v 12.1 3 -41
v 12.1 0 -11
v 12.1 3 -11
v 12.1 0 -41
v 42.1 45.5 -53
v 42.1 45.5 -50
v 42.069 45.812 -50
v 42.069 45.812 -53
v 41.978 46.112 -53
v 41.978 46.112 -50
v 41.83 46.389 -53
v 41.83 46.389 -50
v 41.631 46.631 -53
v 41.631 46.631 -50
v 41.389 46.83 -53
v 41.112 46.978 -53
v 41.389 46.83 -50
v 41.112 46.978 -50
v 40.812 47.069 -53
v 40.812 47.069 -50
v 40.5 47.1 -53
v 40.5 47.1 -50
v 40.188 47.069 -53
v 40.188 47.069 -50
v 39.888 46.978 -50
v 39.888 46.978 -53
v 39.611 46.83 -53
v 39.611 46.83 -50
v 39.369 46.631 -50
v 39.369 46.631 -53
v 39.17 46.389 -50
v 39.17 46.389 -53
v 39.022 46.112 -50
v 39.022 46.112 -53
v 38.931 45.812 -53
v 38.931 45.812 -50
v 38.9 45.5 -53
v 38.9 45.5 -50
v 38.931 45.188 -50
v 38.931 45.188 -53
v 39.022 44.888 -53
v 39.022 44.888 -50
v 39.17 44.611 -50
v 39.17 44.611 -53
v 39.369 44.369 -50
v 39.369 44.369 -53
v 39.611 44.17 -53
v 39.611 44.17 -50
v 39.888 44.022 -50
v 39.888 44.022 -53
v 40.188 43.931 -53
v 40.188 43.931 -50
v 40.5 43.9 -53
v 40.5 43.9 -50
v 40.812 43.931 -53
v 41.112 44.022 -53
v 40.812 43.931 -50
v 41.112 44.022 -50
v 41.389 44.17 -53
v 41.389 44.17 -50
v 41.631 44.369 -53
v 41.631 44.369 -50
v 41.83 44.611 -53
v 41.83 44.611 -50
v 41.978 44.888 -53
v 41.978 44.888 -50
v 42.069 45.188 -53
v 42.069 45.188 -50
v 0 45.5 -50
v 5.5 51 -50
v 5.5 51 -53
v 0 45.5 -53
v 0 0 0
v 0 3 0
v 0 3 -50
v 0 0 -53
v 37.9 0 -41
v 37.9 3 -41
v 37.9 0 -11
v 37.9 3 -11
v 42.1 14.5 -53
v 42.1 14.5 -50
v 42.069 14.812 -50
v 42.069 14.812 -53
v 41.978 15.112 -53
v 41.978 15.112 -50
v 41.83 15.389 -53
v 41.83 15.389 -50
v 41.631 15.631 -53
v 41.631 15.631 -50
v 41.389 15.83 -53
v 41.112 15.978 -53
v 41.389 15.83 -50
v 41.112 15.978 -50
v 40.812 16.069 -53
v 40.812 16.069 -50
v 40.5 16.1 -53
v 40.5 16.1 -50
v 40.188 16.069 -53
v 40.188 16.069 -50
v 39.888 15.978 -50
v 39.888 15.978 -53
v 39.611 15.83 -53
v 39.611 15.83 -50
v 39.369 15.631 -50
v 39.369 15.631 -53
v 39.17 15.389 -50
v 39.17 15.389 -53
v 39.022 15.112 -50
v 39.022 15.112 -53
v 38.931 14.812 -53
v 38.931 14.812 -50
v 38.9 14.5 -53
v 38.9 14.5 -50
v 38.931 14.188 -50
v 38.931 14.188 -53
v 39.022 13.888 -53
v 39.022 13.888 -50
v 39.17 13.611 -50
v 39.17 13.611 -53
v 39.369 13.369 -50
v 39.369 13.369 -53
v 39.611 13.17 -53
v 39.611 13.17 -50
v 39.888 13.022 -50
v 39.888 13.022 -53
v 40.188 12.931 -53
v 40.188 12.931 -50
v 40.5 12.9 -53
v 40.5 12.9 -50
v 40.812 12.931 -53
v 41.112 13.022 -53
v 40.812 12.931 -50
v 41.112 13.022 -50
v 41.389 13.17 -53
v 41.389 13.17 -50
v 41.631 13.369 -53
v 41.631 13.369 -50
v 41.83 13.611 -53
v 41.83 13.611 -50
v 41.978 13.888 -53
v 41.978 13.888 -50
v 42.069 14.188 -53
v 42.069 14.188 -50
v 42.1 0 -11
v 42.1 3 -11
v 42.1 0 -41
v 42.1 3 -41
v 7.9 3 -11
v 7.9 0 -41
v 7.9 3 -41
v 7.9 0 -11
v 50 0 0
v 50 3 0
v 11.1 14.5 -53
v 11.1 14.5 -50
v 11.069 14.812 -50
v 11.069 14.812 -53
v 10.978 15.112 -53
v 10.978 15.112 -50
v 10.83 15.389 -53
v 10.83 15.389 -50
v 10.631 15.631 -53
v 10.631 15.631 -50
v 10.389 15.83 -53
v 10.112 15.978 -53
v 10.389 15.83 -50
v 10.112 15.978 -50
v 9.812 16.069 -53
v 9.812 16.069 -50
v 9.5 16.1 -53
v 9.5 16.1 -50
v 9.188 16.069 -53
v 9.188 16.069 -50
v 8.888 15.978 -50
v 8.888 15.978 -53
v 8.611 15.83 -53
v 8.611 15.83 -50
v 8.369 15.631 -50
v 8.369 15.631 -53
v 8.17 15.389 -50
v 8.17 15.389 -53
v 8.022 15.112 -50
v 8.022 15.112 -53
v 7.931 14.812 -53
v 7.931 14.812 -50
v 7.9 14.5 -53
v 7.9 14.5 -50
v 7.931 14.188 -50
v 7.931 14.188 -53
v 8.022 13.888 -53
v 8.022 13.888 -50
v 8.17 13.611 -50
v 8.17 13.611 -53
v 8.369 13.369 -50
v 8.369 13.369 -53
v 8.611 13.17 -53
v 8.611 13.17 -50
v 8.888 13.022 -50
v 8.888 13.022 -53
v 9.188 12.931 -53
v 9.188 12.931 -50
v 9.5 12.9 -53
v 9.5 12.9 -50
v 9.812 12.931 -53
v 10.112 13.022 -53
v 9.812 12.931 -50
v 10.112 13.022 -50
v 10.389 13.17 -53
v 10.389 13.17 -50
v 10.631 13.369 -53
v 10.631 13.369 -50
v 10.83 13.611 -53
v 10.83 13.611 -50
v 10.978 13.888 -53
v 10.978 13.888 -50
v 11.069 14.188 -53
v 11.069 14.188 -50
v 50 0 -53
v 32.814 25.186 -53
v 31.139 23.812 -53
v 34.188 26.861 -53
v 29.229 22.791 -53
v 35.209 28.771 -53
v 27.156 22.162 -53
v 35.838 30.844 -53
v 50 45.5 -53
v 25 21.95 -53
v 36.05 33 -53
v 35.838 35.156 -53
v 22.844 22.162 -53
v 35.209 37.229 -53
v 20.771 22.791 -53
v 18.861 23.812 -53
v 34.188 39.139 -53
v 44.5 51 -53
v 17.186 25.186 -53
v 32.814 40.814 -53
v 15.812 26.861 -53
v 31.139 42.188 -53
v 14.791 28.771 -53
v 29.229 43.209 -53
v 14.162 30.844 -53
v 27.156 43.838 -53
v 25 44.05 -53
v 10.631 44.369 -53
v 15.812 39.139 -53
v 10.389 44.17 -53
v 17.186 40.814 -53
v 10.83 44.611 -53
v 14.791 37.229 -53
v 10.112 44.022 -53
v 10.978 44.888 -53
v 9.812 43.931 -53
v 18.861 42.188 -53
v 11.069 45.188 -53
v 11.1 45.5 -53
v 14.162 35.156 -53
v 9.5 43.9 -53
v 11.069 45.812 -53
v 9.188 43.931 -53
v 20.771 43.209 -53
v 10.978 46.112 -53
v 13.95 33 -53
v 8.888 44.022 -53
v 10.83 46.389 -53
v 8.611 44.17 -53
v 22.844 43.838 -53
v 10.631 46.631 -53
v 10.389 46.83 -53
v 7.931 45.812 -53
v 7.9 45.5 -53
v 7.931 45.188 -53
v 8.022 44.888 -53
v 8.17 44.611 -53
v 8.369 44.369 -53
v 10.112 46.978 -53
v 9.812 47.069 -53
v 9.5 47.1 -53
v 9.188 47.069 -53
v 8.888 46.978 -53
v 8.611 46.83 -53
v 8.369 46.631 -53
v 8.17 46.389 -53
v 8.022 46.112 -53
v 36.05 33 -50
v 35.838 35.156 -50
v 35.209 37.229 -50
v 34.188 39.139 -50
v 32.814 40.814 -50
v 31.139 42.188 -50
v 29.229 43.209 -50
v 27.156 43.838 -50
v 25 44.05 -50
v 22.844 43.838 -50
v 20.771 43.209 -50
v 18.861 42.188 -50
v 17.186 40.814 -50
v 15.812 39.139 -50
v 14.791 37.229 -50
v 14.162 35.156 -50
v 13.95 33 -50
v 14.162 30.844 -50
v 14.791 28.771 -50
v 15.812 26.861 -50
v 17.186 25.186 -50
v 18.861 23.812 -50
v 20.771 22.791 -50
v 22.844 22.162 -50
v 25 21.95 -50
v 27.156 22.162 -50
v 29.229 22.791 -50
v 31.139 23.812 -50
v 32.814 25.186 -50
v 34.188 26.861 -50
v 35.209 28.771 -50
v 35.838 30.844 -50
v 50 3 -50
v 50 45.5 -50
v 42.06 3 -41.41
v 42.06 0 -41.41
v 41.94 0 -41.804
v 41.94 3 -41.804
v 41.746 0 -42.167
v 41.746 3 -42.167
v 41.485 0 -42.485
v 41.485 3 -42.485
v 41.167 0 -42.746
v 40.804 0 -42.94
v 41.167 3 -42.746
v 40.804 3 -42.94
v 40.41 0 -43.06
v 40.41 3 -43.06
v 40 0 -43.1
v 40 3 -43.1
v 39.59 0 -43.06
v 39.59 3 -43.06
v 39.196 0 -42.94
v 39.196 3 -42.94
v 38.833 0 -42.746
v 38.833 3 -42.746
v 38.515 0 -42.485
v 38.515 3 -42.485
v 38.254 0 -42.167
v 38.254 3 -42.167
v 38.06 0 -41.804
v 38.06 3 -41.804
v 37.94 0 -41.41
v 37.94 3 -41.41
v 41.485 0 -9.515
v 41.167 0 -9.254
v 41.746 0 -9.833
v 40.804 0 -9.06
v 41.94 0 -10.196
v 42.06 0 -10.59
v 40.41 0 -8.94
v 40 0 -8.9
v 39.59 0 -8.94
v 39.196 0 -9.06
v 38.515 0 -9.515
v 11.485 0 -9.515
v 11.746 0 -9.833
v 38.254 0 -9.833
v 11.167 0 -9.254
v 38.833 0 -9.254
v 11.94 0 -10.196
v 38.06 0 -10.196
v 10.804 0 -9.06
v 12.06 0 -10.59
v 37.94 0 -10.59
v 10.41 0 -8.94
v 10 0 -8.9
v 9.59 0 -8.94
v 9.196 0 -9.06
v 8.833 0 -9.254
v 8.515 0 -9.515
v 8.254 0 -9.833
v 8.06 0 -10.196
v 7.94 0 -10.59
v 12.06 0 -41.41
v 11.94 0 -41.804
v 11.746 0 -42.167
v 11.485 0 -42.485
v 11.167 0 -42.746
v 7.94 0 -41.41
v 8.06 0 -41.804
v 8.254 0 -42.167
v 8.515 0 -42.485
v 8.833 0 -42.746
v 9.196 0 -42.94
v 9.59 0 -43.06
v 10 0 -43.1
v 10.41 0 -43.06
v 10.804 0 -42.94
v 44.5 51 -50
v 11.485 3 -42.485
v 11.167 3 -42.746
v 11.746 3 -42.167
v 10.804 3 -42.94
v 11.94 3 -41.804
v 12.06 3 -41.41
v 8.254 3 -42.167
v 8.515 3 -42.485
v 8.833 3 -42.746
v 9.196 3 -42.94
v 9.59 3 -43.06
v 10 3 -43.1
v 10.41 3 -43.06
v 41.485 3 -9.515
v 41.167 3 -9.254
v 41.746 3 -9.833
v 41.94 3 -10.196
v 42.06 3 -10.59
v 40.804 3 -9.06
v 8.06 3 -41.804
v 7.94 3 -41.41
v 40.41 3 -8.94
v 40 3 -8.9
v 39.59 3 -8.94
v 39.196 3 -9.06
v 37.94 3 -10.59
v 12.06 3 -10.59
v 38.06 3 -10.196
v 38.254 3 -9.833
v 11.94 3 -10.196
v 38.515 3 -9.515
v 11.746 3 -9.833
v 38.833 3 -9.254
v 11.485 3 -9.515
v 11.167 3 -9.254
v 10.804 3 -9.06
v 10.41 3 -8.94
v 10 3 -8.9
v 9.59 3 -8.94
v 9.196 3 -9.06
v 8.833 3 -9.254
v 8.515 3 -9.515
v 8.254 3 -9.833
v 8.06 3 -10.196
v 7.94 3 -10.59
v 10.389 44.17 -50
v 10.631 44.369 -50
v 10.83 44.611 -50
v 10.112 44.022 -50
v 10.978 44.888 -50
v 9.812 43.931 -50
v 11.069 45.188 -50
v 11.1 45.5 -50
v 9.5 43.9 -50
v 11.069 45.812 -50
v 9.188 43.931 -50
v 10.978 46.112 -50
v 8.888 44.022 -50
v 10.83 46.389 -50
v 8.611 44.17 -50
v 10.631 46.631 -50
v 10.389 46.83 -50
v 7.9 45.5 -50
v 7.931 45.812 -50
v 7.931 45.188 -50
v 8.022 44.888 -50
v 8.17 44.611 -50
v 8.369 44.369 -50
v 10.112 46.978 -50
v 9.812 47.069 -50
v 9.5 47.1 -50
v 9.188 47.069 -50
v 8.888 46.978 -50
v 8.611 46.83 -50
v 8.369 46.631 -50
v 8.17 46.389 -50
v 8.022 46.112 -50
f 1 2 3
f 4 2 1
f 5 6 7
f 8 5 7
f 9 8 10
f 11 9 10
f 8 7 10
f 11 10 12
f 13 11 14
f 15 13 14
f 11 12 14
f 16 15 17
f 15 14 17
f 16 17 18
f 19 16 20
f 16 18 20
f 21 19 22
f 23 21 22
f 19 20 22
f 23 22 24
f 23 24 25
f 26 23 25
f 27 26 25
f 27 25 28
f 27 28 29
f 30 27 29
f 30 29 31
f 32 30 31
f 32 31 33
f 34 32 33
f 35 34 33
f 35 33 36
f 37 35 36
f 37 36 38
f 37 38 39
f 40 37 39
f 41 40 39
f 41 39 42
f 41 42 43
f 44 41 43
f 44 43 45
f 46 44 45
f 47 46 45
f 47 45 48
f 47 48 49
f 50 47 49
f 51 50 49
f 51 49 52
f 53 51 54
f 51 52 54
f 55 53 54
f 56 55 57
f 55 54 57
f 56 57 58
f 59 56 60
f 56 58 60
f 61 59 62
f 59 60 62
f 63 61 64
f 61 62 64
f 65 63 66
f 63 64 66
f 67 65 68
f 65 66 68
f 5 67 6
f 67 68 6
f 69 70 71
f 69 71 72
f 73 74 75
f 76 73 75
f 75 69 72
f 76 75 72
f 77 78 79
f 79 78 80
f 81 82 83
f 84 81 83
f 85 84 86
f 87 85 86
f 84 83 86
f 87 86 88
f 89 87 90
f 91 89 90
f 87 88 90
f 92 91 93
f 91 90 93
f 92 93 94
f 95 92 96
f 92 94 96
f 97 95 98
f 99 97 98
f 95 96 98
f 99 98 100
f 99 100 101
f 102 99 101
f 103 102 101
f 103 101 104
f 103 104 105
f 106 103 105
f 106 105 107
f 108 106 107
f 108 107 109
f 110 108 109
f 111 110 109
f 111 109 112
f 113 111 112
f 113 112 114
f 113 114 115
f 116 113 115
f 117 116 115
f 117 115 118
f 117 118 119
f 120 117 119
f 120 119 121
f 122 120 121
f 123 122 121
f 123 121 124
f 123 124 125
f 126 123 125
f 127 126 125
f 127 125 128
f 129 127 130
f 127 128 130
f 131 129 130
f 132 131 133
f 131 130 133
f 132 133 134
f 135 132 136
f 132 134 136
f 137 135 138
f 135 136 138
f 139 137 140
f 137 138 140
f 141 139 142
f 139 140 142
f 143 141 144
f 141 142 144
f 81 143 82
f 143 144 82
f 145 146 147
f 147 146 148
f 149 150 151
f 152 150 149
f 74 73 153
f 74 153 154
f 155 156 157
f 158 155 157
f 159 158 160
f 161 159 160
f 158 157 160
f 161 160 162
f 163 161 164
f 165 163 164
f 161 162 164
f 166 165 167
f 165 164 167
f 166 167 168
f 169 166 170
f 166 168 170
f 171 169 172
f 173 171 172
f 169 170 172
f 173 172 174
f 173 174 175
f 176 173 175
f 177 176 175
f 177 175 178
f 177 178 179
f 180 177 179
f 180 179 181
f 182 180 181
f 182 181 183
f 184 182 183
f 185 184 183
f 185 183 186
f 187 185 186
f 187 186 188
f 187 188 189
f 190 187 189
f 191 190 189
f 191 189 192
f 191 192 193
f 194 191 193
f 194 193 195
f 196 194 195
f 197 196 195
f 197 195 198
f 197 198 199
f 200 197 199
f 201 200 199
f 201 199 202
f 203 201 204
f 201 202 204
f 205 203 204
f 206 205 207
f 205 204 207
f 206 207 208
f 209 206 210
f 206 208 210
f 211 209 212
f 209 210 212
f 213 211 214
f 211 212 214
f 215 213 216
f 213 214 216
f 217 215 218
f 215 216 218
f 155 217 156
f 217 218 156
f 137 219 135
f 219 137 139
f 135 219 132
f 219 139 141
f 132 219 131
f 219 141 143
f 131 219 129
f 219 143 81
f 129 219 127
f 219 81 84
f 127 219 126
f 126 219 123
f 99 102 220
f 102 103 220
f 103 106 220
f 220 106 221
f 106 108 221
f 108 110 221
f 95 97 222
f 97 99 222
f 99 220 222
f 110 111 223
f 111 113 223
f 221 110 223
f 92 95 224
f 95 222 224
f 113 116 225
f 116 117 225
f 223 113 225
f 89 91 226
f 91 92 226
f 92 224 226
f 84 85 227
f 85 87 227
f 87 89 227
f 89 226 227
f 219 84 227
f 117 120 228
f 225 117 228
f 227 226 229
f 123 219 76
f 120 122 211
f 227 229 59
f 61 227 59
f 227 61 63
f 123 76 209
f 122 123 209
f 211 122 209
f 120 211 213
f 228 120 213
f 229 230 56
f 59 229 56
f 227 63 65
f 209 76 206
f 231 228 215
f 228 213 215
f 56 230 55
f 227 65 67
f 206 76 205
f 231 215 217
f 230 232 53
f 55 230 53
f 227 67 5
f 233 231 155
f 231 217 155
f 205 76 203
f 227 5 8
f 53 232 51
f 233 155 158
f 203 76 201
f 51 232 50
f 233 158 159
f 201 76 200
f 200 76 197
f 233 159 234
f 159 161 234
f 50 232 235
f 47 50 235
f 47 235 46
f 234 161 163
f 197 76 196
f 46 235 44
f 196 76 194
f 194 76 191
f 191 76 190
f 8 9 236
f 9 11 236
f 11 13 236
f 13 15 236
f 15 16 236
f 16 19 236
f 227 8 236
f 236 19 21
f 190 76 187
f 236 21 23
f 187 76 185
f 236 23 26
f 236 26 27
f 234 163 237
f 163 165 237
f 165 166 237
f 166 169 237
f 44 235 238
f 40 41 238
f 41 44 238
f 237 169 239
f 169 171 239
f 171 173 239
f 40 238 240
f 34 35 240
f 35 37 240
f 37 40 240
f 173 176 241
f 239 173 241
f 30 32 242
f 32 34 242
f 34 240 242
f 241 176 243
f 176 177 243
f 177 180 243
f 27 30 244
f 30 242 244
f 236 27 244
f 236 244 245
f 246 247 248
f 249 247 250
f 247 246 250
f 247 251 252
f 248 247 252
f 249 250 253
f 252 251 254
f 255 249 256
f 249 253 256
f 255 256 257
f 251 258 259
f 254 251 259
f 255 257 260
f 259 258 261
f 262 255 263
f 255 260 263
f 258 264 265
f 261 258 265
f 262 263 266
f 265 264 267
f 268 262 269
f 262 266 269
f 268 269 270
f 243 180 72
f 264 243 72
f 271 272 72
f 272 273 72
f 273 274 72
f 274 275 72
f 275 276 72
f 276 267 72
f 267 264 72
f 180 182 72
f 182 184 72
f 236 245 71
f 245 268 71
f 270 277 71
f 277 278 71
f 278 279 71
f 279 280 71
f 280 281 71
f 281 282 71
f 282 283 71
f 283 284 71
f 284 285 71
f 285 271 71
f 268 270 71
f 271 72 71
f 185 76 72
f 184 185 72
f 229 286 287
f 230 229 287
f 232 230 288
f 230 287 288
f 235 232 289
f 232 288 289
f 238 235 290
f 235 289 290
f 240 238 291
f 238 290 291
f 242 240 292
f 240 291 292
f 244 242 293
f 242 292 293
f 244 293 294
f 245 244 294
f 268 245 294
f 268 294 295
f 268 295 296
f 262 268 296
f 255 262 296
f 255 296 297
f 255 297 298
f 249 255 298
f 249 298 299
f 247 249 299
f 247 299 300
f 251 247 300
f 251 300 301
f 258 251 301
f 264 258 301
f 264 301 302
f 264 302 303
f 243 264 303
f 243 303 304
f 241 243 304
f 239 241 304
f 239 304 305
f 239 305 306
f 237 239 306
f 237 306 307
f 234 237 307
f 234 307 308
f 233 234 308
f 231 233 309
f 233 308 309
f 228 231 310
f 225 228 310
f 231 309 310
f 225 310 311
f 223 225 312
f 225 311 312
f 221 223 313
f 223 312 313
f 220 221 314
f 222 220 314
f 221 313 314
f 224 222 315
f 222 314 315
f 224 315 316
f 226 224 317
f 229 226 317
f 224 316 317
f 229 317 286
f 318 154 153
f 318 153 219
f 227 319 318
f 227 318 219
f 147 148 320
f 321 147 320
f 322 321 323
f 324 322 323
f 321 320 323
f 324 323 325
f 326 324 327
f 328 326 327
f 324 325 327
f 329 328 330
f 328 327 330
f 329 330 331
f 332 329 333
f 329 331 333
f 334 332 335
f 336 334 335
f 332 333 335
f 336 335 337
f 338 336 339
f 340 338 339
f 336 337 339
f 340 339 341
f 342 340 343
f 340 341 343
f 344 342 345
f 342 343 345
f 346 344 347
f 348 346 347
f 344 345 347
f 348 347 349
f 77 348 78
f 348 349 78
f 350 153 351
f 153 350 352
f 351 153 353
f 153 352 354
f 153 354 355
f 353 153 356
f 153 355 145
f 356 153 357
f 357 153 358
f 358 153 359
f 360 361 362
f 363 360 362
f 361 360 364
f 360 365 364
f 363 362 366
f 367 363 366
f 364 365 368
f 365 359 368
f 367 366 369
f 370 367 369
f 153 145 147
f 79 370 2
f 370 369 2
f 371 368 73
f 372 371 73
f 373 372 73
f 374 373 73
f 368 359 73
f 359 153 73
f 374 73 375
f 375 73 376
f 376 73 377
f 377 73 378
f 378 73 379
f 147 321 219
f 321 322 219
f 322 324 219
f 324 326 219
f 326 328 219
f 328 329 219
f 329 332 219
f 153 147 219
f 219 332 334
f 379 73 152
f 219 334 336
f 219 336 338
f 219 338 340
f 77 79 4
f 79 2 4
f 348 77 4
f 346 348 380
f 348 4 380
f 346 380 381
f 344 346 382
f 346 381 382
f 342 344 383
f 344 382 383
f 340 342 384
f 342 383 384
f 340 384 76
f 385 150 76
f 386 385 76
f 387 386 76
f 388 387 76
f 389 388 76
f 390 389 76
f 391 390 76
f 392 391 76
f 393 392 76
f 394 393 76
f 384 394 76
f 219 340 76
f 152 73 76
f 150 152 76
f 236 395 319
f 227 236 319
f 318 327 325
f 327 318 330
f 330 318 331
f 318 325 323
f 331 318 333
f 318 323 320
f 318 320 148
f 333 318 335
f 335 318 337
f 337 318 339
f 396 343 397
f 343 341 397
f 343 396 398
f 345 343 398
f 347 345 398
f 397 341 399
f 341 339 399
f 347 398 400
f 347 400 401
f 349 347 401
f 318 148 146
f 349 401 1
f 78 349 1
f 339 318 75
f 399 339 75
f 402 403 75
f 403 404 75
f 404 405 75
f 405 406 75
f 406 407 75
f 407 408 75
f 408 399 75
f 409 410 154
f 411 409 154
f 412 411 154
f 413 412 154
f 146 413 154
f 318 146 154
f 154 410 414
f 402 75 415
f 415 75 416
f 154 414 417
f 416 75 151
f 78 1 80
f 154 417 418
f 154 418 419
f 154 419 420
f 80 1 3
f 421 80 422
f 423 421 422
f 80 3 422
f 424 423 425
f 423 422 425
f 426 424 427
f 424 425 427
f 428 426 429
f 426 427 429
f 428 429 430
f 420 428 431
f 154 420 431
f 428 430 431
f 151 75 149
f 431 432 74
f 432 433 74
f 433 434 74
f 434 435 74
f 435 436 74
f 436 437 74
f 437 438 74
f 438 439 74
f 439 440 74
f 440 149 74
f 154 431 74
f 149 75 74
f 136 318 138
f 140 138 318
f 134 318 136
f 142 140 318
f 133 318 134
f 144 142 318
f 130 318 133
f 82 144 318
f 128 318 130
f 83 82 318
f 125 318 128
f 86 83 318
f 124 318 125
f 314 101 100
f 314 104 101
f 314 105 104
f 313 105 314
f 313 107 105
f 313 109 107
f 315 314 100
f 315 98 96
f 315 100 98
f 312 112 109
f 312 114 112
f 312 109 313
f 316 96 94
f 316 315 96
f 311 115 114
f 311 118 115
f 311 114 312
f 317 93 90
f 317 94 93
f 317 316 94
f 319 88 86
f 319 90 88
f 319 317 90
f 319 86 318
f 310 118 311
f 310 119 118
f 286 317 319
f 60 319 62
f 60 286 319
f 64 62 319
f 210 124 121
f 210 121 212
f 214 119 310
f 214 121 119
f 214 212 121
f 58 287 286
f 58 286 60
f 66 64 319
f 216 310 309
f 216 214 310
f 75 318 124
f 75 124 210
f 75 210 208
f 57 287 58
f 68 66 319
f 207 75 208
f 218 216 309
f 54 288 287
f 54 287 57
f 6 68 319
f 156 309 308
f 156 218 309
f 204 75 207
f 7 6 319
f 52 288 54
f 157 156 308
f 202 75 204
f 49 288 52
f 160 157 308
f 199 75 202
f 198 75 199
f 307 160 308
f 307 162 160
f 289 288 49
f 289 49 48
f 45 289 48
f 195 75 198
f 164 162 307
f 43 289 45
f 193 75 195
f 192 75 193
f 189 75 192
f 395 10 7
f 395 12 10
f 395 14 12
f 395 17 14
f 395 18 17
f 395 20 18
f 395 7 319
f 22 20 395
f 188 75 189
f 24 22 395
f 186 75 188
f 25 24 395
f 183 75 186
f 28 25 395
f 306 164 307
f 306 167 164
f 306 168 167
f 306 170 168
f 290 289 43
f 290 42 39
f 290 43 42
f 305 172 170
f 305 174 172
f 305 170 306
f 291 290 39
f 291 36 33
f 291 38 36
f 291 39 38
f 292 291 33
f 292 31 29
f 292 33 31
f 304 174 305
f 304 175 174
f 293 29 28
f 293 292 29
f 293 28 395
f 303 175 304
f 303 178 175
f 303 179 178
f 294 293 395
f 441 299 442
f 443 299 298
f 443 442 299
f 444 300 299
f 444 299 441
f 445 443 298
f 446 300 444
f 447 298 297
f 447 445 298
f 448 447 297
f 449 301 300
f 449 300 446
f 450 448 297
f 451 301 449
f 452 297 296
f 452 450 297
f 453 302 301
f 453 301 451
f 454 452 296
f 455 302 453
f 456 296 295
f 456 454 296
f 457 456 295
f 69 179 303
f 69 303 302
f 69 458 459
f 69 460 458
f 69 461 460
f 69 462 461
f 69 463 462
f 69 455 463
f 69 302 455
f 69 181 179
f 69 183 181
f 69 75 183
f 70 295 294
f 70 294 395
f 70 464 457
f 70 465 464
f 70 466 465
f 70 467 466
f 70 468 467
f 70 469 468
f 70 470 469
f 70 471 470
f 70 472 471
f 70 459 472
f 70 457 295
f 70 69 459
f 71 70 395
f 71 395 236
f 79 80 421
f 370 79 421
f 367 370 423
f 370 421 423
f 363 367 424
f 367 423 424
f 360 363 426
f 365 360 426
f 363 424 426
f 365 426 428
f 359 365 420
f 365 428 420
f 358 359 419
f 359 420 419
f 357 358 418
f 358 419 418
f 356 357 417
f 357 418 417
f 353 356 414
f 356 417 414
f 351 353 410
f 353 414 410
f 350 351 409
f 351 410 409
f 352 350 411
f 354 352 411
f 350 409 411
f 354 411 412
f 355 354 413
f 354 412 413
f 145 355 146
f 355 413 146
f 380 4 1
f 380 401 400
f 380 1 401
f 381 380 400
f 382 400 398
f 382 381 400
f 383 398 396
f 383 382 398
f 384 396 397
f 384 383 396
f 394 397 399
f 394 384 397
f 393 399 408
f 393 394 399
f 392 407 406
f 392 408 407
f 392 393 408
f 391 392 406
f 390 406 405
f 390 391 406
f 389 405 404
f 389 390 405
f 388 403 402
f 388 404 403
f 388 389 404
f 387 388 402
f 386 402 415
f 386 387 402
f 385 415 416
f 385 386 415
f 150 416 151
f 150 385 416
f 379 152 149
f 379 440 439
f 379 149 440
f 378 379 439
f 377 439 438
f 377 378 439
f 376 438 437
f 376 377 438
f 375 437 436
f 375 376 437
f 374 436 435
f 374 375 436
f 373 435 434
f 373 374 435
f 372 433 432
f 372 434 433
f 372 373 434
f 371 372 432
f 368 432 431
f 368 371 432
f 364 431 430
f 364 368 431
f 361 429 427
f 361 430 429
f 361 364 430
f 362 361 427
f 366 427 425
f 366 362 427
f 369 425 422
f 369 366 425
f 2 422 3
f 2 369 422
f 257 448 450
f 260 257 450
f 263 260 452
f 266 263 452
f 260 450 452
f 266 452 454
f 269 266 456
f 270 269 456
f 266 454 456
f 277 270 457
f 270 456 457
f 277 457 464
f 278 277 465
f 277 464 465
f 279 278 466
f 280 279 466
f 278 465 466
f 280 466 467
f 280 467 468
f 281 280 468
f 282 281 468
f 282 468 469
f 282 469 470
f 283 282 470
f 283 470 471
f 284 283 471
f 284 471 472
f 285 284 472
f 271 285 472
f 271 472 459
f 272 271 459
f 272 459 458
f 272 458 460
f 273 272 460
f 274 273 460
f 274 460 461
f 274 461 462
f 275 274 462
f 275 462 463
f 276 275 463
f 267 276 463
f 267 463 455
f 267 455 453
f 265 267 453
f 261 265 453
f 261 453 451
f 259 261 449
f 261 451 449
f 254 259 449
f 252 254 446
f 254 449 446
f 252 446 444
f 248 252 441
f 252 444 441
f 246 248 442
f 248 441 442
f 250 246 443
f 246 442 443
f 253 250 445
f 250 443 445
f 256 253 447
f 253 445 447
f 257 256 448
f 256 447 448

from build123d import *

# Parameters (mm, degrees)
SKETCH_1_W          = 53
SKETCH_1_H          = 51
EXTRUDE_1_DEPTH     = 50
SKETCH_2_W          = 50
SKETCH_2_H          = 48
CUT_EXTRUDE_1_DEPTH = 50
CUT_EXTRUDE_2_DEPTH = 25
SKETCH_4_R          = 11.05
SKETCH_4_R_2        = 1.6
CUT_EXTRUDE_3_DEPTH = 50


with BuildPart() as part:
    # 草图1 → 凸台-拉伸1 (new body)
    with BuildSketch(Plane(origin=(0, 0, 0), x_dir=(0, 0, -1), z_dir=(1, 0, 0))):
        with Locations((26.5, 25.5)):
            Rectangle(SKETCH_1_W, SKETCH_1_H)
    extrude(amount=EXTRUDE_1_DEPTH)

    # 草图2 → 切除-拉伸1 (cut)
    with BuildSketch(Plane.ZY):
        with Locations((-25, 27)):
            Rectangle(SKETCH_2_W, SKETCH_2_H)
    extrude(amount=-CUT_EXTRUDE_1_DEPTH, mode=Mode.SUBTRACT)

    # 草图3 → 切除-拉伸2 (cut, symmetric)
    with BuildSketch(Plane(origin=(0, 3, 0), x_dir=(1, 0, 0), z_dir=(0, 1, 0))):
        with BuildLine():
            Line((7.9, 41), (7.9, 11))
            ThreePointArc((7.9, 11), (10, 8.9), (12.1, 11))
            Line((12.1, 11), (12.1, 41))
            ThreePointArc((12.1, 41), (10, 43.1), (7.9, 41))
        make_face()
        with BuildLine():
            Line((37.9, 41), (37.9, 11))
            ThreePointArc((37.9, 11), (40, 8.9), (42.1, 11))
            Line((42.1, 11), (42.1, 41))
            ThreePointArc((42.1, 41), (40, 43.1), (37.9, 41))
        make_face()
    extrude(amount=CUT_EXTRUDE_2_DEPTH, both=True, mode=Mode.SUBTRACT)

    # 草图4 → 切除-拉伸3 (cut)
    with BuildSketch(Plane.XY.offset(-50)):
        with Locations((25, 33)):
            Circle(SKETCH_4_R)
        with Locations((9.5, 45.5)):
            Circle(SKETCH_4_R_2)
        with Locations((40.5, 45.5)):
            Circle(SKETCH_4_R_2)
        with Locations((9.5, 14.5)):
            Circle(SKETCH_4_R_2)
        with Locations((40.5, 14.5)):
            Circle(SKETCH_4_R_2)
        Polygon((5.5, 51), (0, 45.5), (0, 51), align=None)
        Polygon((44.5, 51), (50, 45.5), (50, 51), align=None)
    extrude(amount=-CUT_EXTRUDE_3_DEPTH, mode=Mode.SUBTRACT)


solid = part.part
